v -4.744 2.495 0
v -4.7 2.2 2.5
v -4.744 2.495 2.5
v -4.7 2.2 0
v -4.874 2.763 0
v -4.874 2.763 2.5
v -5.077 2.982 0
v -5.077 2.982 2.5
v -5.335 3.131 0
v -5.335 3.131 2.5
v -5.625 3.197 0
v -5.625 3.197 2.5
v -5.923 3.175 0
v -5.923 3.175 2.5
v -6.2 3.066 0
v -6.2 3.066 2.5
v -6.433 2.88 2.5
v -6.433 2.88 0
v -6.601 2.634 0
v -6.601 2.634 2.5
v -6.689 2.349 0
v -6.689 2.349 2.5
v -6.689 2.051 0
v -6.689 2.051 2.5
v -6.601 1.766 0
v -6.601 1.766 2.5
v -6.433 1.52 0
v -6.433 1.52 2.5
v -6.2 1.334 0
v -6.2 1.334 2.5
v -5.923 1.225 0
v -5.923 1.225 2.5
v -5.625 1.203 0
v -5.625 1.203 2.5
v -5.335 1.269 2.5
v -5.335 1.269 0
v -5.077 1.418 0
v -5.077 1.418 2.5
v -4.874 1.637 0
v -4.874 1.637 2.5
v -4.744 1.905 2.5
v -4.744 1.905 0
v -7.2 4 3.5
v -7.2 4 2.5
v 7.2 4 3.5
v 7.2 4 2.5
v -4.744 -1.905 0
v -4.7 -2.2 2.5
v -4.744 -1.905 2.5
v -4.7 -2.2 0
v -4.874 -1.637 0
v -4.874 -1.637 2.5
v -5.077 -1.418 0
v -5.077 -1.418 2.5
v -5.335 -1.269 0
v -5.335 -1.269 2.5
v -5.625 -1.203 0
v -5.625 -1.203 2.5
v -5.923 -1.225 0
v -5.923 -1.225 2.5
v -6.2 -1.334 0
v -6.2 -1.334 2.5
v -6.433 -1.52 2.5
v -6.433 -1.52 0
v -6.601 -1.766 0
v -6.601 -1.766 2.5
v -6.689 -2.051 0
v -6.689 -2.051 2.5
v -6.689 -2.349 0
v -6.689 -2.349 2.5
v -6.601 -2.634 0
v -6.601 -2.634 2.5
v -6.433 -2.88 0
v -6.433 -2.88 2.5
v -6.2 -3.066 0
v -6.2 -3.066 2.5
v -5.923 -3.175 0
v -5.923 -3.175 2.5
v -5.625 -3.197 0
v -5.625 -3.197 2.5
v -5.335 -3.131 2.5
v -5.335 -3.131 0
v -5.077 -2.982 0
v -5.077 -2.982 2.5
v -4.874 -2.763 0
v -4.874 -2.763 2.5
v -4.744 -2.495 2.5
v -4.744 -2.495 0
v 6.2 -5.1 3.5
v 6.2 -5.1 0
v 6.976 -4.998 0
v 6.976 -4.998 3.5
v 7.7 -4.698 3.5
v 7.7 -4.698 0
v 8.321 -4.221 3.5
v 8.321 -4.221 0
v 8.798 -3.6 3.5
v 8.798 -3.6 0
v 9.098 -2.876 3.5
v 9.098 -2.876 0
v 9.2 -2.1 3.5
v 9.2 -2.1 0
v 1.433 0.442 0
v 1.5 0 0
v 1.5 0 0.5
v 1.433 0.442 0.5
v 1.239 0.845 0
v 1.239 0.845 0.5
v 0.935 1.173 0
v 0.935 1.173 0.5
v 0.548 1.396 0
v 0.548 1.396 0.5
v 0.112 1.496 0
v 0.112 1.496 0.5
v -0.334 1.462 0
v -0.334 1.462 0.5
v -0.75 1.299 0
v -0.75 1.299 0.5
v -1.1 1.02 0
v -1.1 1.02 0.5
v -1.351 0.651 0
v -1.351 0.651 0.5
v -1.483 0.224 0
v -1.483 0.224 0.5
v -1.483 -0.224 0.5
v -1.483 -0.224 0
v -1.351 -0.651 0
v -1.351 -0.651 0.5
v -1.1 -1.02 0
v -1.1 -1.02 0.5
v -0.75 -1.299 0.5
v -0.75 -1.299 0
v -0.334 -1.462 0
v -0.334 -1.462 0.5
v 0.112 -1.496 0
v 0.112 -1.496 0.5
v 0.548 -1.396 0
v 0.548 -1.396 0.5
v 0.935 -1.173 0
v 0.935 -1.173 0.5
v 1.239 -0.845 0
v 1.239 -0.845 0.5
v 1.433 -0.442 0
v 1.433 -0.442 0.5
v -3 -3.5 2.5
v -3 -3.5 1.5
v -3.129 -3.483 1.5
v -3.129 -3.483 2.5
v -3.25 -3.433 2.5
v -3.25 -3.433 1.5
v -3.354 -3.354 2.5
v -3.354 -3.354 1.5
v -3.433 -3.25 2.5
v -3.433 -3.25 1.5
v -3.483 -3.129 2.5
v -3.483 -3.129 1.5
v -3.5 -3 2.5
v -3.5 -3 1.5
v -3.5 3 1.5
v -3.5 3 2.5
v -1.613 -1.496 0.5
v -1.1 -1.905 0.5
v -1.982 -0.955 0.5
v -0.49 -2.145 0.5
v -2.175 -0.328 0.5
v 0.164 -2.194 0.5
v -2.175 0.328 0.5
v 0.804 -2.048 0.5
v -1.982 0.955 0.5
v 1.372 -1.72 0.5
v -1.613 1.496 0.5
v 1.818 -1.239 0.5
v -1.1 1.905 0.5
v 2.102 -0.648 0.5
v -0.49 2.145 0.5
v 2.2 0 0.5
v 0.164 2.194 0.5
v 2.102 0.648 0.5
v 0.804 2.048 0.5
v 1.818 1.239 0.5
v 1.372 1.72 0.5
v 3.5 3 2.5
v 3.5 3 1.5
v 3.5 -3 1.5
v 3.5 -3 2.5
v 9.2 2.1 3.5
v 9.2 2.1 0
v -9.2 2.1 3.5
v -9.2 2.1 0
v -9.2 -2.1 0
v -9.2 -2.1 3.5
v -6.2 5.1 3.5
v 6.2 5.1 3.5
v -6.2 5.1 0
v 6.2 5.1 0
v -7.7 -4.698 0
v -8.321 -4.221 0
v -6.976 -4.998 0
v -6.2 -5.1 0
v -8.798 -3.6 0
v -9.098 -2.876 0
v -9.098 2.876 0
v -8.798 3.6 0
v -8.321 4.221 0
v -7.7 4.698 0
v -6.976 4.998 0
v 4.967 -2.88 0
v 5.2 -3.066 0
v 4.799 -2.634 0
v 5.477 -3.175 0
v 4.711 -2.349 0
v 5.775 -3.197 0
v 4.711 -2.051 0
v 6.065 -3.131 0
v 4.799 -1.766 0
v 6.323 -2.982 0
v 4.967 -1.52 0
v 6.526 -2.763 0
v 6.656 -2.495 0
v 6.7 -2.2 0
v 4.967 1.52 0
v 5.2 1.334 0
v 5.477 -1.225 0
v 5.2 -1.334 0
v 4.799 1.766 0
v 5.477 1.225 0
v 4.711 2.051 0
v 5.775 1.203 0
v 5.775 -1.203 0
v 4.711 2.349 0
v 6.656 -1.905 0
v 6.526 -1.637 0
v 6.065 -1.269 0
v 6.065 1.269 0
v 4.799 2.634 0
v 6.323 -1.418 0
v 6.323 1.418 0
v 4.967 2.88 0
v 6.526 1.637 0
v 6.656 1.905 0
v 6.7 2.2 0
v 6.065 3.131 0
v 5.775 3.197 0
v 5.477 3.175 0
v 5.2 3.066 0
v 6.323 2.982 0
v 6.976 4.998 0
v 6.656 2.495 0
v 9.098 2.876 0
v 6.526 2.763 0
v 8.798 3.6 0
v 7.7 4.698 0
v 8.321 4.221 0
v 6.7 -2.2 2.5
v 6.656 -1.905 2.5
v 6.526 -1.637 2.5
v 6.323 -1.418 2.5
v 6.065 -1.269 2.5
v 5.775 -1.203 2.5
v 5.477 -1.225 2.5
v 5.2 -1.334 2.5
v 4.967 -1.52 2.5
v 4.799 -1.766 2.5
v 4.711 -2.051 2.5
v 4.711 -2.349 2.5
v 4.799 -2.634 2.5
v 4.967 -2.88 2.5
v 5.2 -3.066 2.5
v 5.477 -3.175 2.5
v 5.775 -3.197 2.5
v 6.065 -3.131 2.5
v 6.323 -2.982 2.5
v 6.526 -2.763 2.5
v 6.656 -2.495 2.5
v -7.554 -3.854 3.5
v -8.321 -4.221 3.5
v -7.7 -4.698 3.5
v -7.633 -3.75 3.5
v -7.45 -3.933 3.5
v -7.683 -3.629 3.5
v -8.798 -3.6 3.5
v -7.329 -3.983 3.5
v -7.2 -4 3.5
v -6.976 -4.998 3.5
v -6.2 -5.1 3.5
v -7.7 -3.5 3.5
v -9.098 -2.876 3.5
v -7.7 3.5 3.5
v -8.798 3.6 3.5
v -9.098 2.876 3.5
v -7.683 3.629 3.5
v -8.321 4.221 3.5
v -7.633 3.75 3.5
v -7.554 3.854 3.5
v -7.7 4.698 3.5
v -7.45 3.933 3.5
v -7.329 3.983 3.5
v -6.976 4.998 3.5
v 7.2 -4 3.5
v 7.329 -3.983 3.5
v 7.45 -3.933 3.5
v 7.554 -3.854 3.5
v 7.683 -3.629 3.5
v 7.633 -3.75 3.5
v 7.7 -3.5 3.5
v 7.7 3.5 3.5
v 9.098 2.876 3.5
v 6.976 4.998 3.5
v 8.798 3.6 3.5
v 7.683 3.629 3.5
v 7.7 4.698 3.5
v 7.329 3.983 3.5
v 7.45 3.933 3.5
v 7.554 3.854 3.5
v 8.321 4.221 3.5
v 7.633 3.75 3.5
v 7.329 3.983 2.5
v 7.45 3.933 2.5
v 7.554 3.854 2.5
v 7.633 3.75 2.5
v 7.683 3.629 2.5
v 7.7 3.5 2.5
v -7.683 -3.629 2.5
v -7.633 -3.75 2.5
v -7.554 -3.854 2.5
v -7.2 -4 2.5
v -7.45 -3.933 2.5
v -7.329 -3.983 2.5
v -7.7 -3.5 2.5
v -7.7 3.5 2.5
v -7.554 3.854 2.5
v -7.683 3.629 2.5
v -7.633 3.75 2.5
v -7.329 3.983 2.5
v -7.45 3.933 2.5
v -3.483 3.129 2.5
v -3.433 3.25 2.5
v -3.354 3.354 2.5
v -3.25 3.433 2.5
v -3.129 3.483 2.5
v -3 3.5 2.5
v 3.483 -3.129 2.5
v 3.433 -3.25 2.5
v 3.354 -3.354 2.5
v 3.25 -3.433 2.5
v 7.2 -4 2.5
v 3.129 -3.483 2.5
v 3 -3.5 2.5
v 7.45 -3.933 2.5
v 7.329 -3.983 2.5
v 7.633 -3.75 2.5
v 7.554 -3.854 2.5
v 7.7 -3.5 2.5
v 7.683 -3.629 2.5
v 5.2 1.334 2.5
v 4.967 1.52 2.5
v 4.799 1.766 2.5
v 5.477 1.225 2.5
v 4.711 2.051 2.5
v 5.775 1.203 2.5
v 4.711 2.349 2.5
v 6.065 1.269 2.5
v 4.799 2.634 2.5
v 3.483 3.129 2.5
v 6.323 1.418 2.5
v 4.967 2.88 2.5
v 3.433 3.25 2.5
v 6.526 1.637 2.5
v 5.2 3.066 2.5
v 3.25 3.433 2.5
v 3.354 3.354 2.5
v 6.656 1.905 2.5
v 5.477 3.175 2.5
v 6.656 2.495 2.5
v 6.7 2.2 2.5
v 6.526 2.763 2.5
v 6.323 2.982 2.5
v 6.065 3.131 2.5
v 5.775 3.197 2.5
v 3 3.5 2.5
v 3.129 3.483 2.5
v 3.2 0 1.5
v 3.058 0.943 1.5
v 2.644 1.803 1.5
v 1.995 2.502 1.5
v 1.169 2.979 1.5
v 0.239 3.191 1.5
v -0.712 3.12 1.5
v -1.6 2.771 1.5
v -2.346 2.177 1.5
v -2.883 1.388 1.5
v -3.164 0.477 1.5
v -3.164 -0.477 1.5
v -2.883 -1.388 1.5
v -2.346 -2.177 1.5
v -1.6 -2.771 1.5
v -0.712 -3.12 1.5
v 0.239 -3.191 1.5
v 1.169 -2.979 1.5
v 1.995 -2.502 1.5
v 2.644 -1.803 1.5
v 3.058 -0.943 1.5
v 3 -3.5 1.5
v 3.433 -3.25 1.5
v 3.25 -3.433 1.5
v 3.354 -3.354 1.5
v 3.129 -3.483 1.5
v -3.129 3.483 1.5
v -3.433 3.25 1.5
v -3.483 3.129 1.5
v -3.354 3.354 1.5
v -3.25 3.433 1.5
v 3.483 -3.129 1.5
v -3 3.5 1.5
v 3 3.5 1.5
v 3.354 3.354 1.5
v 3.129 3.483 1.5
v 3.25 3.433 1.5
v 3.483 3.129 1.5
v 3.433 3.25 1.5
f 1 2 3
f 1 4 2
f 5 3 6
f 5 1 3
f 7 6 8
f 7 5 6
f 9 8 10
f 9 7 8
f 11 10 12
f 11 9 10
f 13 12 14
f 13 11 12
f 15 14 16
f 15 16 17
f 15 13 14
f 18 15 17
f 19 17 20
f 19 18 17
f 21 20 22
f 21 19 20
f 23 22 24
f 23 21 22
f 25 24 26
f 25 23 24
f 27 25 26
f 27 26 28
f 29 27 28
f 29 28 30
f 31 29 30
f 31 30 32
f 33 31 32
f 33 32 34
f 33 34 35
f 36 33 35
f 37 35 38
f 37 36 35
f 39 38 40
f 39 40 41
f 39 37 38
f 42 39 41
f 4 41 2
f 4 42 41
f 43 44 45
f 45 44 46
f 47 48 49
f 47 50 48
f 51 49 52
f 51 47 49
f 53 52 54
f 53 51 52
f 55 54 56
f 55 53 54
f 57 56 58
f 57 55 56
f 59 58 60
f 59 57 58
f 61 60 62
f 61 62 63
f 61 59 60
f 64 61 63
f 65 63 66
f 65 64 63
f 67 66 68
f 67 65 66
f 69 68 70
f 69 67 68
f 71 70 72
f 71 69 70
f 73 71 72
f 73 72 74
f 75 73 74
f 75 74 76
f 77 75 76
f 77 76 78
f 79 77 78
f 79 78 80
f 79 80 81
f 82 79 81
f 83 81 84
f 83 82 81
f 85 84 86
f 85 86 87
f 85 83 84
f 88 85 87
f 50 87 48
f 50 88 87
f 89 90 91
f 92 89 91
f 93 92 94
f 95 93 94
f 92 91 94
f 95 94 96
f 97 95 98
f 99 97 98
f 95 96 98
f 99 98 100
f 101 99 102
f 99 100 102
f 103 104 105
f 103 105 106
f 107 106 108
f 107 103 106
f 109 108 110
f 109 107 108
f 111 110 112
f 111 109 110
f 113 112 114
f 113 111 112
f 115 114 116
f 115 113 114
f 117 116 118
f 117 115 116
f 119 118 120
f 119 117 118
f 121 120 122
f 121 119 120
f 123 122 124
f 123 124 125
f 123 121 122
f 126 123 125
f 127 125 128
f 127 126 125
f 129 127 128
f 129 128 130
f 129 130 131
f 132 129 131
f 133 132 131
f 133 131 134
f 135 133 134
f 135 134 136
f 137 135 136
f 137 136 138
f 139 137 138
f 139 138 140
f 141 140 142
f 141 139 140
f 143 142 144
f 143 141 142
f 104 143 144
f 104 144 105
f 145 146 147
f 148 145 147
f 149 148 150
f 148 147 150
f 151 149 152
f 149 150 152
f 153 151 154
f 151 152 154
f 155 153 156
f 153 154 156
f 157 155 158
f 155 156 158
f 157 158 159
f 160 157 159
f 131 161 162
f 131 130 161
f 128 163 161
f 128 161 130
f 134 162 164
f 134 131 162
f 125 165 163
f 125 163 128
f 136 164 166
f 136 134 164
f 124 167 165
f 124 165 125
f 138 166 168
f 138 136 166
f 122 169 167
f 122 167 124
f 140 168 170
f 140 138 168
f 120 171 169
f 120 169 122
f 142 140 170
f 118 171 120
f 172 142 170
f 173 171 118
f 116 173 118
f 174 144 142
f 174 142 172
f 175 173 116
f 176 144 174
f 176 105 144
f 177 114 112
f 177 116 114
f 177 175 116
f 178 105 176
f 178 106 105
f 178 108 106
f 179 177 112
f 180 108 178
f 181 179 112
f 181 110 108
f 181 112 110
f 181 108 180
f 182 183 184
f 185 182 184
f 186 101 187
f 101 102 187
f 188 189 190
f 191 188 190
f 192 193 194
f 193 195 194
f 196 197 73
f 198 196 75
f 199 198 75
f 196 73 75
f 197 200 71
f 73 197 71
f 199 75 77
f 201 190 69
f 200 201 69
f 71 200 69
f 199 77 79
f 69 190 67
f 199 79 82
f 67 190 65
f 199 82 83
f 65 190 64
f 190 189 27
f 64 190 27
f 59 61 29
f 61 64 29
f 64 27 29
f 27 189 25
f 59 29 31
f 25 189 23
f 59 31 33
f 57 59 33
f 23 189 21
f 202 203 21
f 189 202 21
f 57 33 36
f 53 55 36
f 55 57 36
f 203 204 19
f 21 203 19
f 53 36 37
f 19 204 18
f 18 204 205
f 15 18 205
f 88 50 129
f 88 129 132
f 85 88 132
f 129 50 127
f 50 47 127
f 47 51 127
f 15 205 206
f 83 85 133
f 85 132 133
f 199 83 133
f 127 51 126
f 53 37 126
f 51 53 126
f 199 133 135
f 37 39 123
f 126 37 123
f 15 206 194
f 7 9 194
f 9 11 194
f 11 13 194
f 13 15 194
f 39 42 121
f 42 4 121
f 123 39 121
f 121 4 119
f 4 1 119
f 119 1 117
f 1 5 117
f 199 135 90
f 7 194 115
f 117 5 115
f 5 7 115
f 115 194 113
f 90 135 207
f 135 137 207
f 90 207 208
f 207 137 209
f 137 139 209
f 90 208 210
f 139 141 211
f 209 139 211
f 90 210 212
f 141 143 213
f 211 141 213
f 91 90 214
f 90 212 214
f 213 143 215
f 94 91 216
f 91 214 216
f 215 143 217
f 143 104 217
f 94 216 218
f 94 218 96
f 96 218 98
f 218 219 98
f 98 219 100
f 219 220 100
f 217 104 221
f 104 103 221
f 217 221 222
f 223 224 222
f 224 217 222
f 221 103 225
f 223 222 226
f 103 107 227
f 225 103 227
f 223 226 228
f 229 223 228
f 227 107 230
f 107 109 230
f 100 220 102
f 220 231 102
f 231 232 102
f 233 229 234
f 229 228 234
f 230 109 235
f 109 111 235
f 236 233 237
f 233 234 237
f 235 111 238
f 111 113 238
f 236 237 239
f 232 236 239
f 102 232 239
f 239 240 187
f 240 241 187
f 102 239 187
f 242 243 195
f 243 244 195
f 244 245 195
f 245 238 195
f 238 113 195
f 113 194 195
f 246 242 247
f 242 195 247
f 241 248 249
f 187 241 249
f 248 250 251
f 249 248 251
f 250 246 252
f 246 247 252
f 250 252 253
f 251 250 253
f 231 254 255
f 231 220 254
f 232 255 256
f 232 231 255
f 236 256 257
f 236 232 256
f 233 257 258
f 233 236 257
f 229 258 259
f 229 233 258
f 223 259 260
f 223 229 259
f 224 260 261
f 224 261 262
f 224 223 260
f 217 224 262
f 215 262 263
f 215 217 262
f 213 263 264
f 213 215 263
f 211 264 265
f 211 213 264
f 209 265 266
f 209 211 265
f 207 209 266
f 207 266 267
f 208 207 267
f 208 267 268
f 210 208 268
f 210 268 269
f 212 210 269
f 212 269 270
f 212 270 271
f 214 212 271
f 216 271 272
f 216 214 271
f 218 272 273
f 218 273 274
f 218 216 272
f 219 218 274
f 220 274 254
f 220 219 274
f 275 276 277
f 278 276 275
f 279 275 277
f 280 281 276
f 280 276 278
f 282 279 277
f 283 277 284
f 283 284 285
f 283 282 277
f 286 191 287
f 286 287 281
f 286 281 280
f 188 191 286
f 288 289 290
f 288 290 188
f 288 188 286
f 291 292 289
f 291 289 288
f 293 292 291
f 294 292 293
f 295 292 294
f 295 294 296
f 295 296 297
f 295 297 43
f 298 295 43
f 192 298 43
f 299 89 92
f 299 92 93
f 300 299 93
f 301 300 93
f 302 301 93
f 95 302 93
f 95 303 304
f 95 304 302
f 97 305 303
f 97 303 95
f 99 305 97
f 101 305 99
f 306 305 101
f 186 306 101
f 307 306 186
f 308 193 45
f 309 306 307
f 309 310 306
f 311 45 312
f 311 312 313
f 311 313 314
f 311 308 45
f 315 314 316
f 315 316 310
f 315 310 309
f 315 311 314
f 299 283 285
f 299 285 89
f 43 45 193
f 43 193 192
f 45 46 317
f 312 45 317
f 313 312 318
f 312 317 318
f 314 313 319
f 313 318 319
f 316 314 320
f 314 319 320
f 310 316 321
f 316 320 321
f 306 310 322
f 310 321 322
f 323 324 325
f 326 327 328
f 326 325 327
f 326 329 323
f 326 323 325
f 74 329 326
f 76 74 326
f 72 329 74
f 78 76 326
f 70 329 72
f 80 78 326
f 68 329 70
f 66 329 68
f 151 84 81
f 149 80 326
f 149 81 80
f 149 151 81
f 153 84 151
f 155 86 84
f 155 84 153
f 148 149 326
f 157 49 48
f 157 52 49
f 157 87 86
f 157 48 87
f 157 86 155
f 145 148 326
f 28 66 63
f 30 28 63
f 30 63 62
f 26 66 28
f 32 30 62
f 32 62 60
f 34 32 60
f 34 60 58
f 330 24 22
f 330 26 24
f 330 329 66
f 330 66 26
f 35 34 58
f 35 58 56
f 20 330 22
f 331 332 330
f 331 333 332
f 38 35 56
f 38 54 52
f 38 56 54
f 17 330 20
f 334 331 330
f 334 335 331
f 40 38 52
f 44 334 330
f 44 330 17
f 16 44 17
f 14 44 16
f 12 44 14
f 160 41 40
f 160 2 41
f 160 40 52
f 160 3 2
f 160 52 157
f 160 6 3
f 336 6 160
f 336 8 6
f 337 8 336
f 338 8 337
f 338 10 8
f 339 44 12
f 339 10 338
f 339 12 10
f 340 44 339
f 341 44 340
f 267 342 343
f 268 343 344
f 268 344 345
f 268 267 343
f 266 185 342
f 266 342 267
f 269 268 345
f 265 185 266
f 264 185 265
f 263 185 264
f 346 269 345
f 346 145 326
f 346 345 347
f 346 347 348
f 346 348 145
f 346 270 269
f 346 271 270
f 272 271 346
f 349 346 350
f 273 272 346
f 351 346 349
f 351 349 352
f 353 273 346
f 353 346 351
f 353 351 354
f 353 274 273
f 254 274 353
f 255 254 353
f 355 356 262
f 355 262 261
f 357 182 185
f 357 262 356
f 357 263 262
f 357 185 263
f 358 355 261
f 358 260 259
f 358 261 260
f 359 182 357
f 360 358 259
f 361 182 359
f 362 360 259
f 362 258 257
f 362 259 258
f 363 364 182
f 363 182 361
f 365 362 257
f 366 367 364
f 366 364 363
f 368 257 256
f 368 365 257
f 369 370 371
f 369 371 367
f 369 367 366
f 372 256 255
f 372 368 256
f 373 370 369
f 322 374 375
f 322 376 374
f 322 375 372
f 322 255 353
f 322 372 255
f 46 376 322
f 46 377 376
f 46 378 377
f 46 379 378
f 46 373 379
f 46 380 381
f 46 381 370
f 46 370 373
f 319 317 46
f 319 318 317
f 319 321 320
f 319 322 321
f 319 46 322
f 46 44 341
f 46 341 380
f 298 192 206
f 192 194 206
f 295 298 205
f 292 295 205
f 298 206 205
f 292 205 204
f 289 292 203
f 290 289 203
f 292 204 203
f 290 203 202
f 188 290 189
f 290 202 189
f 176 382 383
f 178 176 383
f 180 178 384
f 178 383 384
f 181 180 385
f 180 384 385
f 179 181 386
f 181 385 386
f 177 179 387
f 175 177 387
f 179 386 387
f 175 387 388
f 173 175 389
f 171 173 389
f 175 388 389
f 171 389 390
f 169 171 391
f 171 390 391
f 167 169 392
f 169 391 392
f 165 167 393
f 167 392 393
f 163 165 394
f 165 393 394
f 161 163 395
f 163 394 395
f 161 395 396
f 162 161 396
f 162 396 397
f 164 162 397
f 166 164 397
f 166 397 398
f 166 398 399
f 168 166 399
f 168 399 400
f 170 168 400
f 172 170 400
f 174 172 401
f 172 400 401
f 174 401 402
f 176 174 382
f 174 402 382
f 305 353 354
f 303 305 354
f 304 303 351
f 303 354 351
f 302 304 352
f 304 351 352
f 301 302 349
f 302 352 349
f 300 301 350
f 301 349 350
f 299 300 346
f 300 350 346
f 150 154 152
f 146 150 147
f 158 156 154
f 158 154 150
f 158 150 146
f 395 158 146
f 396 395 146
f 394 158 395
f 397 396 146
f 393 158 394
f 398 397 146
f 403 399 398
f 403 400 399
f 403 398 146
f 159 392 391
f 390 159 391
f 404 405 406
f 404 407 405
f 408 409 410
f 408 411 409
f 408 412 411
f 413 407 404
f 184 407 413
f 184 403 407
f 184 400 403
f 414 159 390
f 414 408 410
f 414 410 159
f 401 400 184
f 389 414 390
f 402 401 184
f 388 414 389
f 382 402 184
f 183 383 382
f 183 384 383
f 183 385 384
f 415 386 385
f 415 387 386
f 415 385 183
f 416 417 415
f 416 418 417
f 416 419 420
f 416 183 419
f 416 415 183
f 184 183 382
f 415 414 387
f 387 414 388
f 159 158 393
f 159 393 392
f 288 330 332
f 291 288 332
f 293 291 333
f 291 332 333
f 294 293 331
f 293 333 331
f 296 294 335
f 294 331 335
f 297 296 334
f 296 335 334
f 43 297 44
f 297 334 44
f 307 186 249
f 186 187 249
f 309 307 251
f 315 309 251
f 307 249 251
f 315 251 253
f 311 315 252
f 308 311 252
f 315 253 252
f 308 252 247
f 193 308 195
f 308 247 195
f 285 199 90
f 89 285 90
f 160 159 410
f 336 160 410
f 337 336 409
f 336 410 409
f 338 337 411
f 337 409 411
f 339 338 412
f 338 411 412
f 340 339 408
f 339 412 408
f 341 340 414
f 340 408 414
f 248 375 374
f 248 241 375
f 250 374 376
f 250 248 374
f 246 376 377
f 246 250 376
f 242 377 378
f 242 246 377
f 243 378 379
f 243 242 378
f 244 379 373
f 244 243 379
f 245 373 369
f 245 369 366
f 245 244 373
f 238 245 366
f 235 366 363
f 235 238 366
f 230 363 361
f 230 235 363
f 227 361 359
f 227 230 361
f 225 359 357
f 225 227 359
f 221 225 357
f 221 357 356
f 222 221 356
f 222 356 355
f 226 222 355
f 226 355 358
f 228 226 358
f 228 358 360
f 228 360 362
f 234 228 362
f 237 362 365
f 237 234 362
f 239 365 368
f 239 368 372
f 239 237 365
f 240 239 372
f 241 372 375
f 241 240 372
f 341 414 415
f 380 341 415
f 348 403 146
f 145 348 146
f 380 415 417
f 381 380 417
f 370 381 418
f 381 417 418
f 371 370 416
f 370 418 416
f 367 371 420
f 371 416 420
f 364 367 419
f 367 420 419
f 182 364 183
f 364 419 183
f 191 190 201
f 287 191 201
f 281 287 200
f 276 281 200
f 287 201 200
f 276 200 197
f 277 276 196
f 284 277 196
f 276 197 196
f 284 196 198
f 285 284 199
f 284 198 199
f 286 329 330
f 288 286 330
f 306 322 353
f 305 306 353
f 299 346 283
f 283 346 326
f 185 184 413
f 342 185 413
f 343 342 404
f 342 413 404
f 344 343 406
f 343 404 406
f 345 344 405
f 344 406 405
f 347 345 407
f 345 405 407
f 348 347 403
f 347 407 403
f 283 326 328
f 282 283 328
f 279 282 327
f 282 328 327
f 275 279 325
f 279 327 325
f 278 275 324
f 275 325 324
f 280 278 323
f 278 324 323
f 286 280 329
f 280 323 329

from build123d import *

# Parameters (mm, degrees)
F0_R     = 1
F0_R_2   = 1.5
F1_DEPTH = 0.5
F2_R     = 1
F2_R_2   = 2.2
F3_DEPTH = 1
F4_SIZE  = 0.99999
F5_R     = 1
F6_DEPTH = 1
F8_DEPTH = 1


# Not quite as in the source:
# - a fillet or chamfer is up to 0.001 mm smaller than in the source, because OpenCascade refuses the exact size


with BuildPart() as f1:
    # F0 (on Top) → F1 (new body)
    with BuildSketch(Plane.XY):
        with BuildLine():
            Line((-6.2, -5.1), (6.2, -5.1))
            ThreePointArc((6.2, -5.1), (8.3213203436, -4.2213203436), (9.2, -2.1))
            Line((9.2, -2.1), (9.2, 2.1))
            ThreePointArc((9.2, 2.1), (8.3213203436, 4.2213203436), (6.2, 5.1))
            Line((6.2, 5.1), (-6.2, 5.1))
            ThreePointArc((-6.2, 5.1), (-8.3213203436, 4.2213203436), (-9.2, 2.1))
            Line((-9.2, 2.1), (-9.2, -2.1))
            ThreePointArc((-9.2, -2.1), (-8.3213203436, -4.2213203436), (-6.2, -5.1))
        make_face()
        with Locations((-5.7, -2.2)):
            Circle(F0_R, mode=Mode.SUBTRACT)
        with Locations((5.7, -2.2)):
            Circle(F0_R, mode=Mode.SUBTRACT)
        with Locations((-5.7, 2.2)):
            Circle(F0_R, mode=Mode.SUBTRACT)
        Circle(F0_R_2, mode=Mode.SUBTRACT)
        with Locations((5.7, 2.2)):
            Circle(F0_R, mode=Mode.SUBTRACT)
    extrude(amount=F1_DEPTH)

    # F2 (on face) → F3 (join)
    with BuildSketch(Plane.XY.offset(0.5)):
        with BuildLine():
            ThreePointArc((-6.2, 5.1), (-8.3213203436, 4.2213203436), (-9.2, 2.1))
            Line((-9.2, 2.1), (-9.2, -2.1))
            ThreePointArc((-9.2, -2.1), (-8.3213203436, -4.2213203436), (-6.2, -5.1))
            Line((-6.2, -5.1), (6.2, -5.1))
            ThreePointArc((6.2, -5.1), (8.3213203436, -4.2213203436), (9.2, -2.1))
            Line((9.2, -2.1), (9.2, 2.1))
            ThreePointArc((9.2, 2.1), (8.3213203436, 4.2213203436), (6.2, 5.1))
            Line((6.2, 5.1), (-6.2, 5.1))
        make_face()
        with Locations((-5.7, -2.2)):
            Circle(F2_R, mode=Mode.SUBTRACT)
        Circle(F2_R_2, mode=Mode.SUBTRACT)
        with Locations((5.7, -2.2)):
            Circle(F2_R, mode=Mode.SUBTRACT)
        with Locations((-5.7, 2.2)):
            Circle(F2_R, mode=Mode.SUBTRACT)
        with Locations((5.7, 2.2)):
            Circle(F2_R, mode=Mode.SUBTRACT)
    extrude(amount=F3_DEPTH)

    # F4 (size 1 in the source; OpenCascade refuses exactly that, so slightly less here)
    f4_edges = [f1.edges().sort_by_distance(p)[0] for p in [
        (-2.2, 0, 1.5),
    ]]
    chamfer(f4_edges, length=F4_SIZE)

    # F5 (on face) → F6 (join)
    with BuildSketch(Plane.XY.offset(1.5)):
        with BuildLine():
            Line((6.2, 5.1), (-6.2, 5.1))
            ThreePointArc((-6.2, 5.1), (-8.3213203436, 4.2213203436), (-9.2, 2.1))
            Line((-9.2, 2.1), (-9.2, -2.1))
            ThreePointArc((-9.2, -2.1), (-8.3213203436, -4.2213203436), (-6.2, -5.1))
            Line((-6.2, -5.1), (6.2, -5.1))
            ThreePointArc((6.2, -5.1), (8.3213203436, -4.2213203436), (9.2, -2.1))
            Line((9.2, -2.1), (9.2, 2.1))
            ThreePointArc((9.2, 2.1), (8.3213203436, 4.2213203436), (6.2, 5.1))
        make_face()
        with Locations((-5.7, -2.2)):
            Circle(F5_R, mode=Mode.SUBTRACT)
        with BuildLine():
            ThreePointArc((3.5, -3), (3.3535533906, -3.3535533906), (3, -3.5))
            Line((3, -3.5), (-3, -3.5))
            ThreePointArc((-3, -3.5), (-3.3535533906, -3.3535533906), (-3.5, -3))
            Line((-3.5, -3), (-3.5, 3))
            ThreePointArc((-3.5, 3), (-3.3535533906, 3.3535533906), (-3, 3.5))
            Line((-3, 3.5), (3, 3.5))
            ThreePointArc((3, 3.5), (3.3535533906, 3.3535533906), (3.5, 3))
            Line((3.5, 3), (3.5, -3))
        make_face(mode=Mode.SUBTRACT)
        with Locations((5.7, -2.2)):
            Circle(F5_R, mode=Mode.SUBTRACT)
        with Locations((-5.7, 2.2)):
            Circle(F5_R, mode=Mode.SUBTRACT)
        with Locations((5.7, 2.2)):
            Circle(F5_R, mode=Mode.SUBTRACT)
    extrude(amount=F6_DEPTH)

    # F7 (on face) → F8 (join)
    with BuildSketch(Plane.XY.offset(2.5)):
        with BuildLine():
            ThreePointArc((6.2, -5.1), (8.3213203436, -4.2213203436), (9.2, -2.1))
            Line((9.2, -2.1), (9.2, 2.1))
            ThreePointArc((9.2, 2.1), (8.3213203436, 4.2213203436), (6.2, 5.1))
            Line((6.2, 5.1), (-6.2, 5.1))
            ThreePointArc((-6.2, 5.1), (-8.3213203436, 4.2213203436), (-9.2, 2.1))
            Line((-9.2, 2.1), (-9.2, -2.1))
            ThreePointArc((-9.2, -2.1), (-8.3213203436, -4.2213203436), (-6.2, -5.1))
            Line((-6.2, -5.1), (6.2, -5.1))
        make_face()
        with BuildLine():
            ThreePointArc((7.7, -3.5), (7.5535533906, -3.8535533906), (7.2, -4))
            Line((7.2, -4), (-7.2, -4))
            ThreePointArc((-7.2, -4), (-7.5535533906, -3.8535533906), (-7.7, -3.5))
            Line((-7.7, -3.5), (-7.7, 3.5))
            ThreePointArc((-7.7, 3.5), (-7.5535533906, 3.8535533906), (-7.2, 4))
            Line((-7.2, 4), (7.2, 4))
            ThreePointArc((7.2, 4), (7.5535533906, 3.8535533906), (7.7, 3.5))
            Line((7.7, 3.5), (7.7, -3.5))
        make_face(mode=Mode.SUBTRACT)
    extrude(amount=F8_DEPTH)


solid = f1.part
